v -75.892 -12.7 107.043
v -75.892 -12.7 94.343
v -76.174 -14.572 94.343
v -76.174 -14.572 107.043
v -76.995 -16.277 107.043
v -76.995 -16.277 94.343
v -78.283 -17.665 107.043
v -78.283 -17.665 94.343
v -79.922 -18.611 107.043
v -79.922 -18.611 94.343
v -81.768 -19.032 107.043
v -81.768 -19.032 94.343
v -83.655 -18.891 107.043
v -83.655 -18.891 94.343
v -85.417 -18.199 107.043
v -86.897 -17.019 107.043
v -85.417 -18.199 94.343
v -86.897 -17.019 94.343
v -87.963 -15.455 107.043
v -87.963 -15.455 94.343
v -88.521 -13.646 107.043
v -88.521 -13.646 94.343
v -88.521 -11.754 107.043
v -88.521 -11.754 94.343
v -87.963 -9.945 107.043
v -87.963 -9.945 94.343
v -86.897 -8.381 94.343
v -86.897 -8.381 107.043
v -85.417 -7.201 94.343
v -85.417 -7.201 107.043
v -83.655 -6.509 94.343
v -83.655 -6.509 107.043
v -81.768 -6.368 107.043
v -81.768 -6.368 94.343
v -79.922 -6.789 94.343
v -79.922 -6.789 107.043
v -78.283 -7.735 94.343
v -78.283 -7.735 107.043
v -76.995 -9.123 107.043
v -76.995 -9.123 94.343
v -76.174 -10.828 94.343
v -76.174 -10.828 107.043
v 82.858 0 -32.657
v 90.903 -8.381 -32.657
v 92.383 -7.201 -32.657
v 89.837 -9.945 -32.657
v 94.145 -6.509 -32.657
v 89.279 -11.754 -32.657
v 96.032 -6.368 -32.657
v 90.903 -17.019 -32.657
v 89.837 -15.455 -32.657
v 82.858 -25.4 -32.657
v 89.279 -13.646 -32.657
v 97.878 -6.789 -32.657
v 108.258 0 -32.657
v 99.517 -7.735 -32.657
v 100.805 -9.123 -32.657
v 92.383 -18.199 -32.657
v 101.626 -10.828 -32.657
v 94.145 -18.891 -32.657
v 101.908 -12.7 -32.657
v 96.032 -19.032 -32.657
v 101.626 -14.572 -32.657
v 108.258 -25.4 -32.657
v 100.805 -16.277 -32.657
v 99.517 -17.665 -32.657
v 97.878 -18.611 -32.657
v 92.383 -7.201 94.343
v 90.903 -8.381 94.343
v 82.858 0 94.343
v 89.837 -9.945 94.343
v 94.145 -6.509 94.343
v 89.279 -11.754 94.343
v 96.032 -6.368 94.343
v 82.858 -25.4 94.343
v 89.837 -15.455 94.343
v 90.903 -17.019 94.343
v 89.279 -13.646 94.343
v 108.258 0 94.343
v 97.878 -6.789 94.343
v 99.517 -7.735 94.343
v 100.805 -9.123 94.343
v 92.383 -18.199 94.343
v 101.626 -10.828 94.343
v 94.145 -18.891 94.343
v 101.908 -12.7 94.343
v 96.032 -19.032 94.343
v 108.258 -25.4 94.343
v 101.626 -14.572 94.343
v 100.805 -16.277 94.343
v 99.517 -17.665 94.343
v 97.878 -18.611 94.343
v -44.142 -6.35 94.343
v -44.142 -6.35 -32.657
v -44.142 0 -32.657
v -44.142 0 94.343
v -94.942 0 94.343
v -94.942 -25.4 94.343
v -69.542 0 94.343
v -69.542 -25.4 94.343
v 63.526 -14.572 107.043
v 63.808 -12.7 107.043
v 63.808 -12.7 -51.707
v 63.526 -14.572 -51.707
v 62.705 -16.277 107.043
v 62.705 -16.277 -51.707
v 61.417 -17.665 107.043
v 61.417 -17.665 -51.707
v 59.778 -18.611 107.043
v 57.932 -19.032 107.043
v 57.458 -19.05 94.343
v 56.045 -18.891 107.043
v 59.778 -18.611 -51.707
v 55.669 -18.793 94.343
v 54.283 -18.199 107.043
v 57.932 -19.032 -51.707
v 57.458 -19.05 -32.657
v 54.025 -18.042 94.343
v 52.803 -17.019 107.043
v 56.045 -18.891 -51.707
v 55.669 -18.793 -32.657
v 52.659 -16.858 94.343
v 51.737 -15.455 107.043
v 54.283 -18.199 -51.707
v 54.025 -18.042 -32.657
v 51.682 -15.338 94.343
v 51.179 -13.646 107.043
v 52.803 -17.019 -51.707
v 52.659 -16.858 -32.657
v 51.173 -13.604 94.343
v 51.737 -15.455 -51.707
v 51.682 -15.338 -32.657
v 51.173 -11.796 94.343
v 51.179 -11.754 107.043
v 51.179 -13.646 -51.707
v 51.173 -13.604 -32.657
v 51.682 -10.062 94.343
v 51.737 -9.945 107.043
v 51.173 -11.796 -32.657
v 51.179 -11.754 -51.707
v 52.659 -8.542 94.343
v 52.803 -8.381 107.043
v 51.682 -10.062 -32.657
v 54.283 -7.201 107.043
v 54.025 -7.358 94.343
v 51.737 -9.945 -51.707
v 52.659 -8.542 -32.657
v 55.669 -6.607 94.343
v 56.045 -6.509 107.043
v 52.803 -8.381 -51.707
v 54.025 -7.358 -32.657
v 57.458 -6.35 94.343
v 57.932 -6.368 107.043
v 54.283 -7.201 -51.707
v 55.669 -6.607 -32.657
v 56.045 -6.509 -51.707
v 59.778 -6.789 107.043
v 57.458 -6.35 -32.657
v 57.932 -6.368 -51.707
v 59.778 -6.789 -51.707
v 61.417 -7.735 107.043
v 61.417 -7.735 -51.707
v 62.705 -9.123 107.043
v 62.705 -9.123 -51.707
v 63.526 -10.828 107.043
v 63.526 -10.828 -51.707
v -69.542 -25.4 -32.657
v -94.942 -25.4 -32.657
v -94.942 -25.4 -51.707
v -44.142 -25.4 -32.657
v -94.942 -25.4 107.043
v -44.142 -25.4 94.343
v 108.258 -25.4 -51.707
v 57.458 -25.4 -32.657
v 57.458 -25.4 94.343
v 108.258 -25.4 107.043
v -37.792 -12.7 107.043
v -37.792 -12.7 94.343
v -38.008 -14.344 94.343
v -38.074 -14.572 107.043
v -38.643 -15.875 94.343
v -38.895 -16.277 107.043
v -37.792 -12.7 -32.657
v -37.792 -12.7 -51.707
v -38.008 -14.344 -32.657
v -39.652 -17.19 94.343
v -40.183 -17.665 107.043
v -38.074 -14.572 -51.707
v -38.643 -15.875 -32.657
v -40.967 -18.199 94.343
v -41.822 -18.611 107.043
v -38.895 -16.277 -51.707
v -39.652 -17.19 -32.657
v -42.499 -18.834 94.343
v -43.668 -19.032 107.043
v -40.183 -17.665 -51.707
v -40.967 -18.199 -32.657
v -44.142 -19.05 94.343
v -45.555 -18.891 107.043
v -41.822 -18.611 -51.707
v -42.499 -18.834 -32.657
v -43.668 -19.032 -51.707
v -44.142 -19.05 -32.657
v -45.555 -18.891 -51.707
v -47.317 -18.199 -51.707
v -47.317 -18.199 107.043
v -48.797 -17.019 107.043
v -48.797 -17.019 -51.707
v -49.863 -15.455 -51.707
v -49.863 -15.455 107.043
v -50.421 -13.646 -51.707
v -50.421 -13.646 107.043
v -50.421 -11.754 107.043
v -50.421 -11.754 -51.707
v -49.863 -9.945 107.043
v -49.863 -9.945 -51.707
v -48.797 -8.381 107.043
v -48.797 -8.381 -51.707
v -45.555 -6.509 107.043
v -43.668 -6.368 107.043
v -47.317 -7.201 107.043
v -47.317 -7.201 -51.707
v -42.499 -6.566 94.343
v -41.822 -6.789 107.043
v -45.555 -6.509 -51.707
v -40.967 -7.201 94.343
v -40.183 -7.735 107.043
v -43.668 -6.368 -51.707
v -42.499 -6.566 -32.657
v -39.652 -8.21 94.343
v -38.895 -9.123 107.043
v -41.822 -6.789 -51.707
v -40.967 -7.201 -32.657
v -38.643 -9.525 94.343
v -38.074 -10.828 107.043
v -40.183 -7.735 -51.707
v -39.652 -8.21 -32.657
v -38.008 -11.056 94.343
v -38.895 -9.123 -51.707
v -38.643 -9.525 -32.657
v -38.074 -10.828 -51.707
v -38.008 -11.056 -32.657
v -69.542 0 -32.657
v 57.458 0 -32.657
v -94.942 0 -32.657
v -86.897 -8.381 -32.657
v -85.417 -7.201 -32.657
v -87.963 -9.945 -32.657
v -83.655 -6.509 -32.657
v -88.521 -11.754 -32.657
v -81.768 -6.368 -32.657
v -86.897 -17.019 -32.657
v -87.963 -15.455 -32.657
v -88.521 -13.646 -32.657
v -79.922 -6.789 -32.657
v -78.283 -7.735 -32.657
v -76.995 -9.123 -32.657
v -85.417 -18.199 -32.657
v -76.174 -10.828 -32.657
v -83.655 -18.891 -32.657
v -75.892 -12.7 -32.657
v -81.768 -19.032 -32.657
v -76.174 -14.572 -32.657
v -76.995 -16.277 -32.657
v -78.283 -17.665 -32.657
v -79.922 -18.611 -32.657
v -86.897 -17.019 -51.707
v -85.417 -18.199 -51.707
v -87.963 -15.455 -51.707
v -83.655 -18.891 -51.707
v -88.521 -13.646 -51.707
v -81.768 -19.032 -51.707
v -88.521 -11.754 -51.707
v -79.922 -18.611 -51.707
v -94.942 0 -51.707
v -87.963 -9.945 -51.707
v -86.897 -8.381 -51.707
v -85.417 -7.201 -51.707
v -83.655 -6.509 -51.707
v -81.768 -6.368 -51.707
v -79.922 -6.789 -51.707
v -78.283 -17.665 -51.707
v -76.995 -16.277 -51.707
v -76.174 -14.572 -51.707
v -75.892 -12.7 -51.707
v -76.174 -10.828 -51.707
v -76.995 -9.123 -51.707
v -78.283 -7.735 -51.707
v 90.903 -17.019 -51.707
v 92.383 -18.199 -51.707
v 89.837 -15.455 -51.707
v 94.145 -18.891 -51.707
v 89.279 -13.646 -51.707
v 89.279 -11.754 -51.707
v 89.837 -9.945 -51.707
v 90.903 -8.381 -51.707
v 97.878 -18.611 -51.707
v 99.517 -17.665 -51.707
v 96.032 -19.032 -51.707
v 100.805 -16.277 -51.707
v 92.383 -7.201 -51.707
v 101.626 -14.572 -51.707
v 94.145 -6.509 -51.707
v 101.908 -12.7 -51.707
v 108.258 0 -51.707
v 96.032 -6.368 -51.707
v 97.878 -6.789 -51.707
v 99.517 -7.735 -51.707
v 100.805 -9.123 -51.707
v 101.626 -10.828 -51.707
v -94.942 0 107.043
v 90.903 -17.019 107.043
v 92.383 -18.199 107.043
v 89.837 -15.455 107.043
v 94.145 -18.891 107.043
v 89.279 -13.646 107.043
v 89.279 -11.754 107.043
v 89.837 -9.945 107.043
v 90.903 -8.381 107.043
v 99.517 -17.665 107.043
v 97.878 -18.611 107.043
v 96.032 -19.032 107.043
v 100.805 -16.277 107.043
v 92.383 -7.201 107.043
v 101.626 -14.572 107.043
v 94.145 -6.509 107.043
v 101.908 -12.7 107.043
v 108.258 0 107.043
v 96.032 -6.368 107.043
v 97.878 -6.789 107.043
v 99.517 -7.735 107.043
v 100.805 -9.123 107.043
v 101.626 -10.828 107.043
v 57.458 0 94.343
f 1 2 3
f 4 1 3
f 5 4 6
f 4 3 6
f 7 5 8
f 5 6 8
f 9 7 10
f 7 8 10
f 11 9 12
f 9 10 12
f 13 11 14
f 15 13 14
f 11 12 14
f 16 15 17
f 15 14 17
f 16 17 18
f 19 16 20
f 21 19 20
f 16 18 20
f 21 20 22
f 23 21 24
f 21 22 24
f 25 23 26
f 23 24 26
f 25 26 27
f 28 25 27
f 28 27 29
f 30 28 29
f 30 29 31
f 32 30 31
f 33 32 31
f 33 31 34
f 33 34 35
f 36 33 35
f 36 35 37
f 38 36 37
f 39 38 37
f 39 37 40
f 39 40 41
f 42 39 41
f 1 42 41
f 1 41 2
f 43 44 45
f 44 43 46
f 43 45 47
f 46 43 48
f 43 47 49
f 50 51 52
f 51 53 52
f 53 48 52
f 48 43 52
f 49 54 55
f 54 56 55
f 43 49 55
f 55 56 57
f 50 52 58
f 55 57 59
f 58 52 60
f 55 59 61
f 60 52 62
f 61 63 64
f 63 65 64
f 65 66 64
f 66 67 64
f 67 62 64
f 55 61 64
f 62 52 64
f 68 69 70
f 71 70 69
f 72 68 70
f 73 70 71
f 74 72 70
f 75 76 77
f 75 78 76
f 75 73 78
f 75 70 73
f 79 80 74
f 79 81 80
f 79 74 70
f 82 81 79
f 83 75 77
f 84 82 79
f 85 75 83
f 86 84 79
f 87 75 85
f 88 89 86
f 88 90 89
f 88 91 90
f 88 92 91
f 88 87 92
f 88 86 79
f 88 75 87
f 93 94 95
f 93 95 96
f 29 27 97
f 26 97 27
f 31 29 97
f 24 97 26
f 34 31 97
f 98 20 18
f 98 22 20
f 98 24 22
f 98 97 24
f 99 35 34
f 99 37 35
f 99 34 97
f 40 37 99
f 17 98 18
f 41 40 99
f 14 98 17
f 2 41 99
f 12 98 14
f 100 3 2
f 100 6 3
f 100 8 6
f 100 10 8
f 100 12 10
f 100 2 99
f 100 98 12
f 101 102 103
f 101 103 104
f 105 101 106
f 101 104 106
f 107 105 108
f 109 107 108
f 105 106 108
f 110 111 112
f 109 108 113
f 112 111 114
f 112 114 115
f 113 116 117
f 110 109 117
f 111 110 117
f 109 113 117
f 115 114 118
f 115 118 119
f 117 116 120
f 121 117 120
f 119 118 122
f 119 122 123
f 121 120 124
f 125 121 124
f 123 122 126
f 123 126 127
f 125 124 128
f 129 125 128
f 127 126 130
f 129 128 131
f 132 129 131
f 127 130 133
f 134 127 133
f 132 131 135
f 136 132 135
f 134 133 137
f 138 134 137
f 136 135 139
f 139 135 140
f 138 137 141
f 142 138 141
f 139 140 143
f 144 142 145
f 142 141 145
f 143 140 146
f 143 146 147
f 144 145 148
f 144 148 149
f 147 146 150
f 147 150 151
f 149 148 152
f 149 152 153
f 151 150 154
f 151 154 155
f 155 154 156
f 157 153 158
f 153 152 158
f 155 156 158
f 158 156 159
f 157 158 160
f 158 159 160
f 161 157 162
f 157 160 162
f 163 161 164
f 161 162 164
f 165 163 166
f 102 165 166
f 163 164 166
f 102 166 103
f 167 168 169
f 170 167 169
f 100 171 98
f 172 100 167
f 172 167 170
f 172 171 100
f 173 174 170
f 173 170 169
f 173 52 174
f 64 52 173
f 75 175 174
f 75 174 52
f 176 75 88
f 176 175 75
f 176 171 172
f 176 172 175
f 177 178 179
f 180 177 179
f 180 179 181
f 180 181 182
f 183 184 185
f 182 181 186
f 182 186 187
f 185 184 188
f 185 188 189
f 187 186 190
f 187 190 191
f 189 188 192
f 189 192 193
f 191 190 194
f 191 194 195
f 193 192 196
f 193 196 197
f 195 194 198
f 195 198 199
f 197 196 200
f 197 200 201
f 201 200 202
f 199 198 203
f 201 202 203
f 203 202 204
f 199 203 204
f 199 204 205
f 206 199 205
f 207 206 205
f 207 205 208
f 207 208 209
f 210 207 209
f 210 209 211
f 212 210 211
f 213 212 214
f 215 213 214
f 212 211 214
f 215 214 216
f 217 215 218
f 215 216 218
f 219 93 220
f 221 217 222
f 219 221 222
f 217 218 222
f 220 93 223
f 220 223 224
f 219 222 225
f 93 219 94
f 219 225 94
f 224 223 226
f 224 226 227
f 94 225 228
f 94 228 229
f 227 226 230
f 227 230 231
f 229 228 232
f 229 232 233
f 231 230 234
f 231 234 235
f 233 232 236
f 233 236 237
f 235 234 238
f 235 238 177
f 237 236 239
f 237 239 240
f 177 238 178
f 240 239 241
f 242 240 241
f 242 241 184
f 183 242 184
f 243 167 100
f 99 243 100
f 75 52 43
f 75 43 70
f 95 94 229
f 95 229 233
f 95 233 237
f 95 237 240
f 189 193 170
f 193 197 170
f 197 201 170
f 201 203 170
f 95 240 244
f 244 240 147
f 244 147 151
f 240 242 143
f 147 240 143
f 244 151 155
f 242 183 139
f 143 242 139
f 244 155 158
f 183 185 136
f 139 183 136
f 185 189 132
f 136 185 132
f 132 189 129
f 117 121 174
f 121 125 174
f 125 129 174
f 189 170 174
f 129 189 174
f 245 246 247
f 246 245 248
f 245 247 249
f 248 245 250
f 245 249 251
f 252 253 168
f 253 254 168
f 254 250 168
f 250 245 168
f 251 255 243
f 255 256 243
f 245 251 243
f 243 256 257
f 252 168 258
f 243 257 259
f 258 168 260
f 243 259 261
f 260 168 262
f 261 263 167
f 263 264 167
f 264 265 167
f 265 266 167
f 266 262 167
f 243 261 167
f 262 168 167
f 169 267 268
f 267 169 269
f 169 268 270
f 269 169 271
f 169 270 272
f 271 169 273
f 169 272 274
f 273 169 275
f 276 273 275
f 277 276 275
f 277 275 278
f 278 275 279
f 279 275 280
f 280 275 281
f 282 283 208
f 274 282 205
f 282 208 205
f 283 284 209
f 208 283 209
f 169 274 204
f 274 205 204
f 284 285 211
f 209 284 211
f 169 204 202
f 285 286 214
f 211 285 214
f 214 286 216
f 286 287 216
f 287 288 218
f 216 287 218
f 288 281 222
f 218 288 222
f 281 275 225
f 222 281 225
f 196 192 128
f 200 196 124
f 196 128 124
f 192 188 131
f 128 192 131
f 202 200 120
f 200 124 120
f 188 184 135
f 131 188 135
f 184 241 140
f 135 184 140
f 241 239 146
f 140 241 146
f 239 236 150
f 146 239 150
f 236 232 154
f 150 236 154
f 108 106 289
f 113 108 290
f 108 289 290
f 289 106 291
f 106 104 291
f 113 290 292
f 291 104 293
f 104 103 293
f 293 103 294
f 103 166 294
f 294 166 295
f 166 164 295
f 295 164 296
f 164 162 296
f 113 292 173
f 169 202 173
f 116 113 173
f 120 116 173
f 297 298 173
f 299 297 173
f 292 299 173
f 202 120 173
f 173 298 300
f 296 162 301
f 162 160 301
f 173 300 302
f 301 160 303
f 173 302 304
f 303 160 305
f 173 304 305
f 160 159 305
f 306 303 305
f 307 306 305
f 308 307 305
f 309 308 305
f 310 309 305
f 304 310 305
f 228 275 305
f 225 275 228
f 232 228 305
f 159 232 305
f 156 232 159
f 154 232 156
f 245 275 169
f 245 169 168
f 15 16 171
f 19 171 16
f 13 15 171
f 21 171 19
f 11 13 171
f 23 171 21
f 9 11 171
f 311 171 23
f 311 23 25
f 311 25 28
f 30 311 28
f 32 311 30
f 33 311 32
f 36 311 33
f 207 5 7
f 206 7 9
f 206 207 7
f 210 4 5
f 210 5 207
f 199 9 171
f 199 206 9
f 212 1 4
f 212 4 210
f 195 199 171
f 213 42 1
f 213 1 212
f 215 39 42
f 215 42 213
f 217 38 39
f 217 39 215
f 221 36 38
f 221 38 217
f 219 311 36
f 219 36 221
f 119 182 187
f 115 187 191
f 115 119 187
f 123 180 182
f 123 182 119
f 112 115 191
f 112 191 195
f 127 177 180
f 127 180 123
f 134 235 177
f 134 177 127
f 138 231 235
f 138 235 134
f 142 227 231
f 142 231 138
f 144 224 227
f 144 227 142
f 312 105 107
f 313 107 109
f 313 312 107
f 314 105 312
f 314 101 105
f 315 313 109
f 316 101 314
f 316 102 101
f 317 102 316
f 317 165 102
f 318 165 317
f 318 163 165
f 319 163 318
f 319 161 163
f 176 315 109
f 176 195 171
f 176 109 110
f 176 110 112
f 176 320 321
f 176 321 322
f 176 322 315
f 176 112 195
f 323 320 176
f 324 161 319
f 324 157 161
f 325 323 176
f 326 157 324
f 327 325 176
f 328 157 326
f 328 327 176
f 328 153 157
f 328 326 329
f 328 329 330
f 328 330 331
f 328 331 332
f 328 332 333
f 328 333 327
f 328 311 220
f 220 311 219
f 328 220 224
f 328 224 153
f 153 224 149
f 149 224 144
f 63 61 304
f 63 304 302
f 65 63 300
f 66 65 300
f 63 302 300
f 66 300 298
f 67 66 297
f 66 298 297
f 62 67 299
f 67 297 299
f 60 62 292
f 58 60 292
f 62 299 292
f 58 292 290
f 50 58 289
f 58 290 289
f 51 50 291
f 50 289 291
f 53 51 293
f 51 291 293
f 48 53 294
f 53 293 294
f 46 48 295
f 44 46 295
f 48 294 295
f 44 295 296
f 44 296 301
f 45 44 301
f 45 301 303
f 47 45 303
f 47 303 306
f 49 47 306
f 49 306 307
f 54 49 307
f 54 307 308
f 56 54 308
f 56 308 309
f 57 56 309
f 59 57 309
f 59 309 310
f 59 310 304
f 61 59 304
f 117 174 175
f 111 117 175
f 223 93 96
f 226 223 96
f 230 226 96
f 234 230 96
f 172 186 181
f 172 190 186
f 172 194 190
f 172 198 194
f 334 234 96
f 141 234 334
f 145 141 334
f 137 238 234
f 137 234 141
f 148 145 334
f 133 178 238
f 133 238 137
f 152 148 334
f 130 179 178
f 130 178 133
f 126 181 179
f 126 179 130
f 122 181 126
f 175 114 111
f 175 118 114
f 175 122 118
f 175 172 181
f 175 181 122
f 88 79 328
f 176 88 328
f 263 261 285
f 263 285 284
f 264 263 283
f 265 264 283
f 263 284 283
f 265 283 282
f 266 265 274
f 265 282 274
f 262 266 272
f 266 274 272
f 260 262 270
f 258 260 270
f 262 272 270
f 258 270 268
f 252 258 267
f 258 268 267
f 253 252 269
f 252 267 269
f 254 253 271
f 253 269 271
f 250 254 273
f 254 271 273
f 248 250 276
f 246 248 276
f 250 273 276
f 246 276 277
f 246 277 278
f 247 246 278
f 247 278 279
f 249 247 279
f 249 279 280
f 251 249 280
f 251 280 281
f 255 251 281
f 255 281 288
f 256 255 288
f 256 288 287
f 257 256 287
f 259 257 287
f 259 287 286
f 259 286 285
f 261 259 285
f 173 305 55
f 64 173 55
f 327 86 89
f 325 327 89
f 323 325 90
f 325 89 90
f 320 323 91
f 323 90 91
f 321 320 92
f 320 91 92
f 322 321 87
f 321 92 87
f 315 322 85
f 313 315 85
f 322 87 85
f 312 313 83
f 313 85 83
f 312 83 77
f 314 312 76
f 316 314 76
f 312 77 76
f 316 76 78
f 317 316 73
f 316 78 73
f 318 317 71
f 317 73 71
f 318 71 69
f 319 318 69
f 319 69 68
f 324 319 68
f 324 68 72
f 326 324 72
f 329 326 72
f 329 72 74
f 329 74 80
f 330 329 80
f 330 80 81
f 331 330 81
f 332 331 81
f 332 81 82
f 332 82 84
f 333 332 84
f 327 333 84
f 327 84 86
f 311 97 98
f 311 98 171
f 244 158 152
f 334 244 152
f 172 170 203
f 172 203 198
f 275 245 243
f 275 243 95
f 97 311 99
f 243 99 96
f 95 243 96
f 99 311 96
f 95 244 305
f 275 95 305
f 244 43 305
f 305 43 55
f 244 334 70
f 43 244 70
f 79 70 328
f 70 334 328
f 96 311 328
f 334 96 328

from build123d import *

# Parameters (mm, degrees)
F0_W     = 203.2
F0_H     = 158.75
F1_DEPTH = 25.4
F2_W     = 25.4
F2_H     = 127
F3_DEPTH = 25.4
F4_R     = 6.35
F5_DEPTH = 177.8
F6_R     = 6.35
F7_DEPTH = 177.8
F8_W     = 101.6
F8_H     = 127
F9_DEPTH = 25.4


with BuildPart() as f1:
    # F0 (on Front) → F1 (new body)
    with BuildSketch(Plane.XZ):
        with Locations((6.657936, 27.667538)):
            Rectangle(F0_W, F0_H)
    extrude(amount=F1_DEPTH)

    # F2 (on face) → F3 (cut)
    with BuildSketch(Plane.XZ.offset(25.4)):
        with Locations((-82.242064, 30.842538)):
            Rectangle(F2_W, F2_H)
        with Locations((95.557936, 30.842538)):
            Rectangle(F2_W, F2_H)
    extrude(amount=-F3_DEPTH, mode=Mode.SUBTRACT)

    # F4 (on face) → F5 (cut)
    with BuildSketch(Plane(origin=(0, 0, -51.707462), x_dir=(1, 0, 0), z_dir=(0, 0, -1))):
        with Locations((-44.142064, 12.7)):
            Circle(F4_R)
        with Locations((57.457936, 12.7)):
            Circle(F4_R)
    extrude(amount=-F5_DEPTH, mode=Mode.SUBTRACT)

    # F6 (on face) → F7 (cut)
    with BuildSketch(Plane(origin=(0, 0, -51.707462), x_dir=(1, 0, 0), z_dir=(0, 0, -1))):
        with Locations((-82.242064, 12.7)):
            Circle(F6_R)
        with Locations((95.557936, 12.7)):
            Circle(F6_R)
    extrude(amount=-F7_DEPTH, mode=Mode.SUBTRACT)

    # F8 (on face) → F9 (cut)
    with BuildSketch(Plane.XZ.offset(25.4)):
        with Locations((6.657936, 30.842538)):
            Rectangle(F8_W, F8_H)
    extrude(amount=-F9_DEPTH, mode=Mode.SUBTRACT)


solid = f1.part
